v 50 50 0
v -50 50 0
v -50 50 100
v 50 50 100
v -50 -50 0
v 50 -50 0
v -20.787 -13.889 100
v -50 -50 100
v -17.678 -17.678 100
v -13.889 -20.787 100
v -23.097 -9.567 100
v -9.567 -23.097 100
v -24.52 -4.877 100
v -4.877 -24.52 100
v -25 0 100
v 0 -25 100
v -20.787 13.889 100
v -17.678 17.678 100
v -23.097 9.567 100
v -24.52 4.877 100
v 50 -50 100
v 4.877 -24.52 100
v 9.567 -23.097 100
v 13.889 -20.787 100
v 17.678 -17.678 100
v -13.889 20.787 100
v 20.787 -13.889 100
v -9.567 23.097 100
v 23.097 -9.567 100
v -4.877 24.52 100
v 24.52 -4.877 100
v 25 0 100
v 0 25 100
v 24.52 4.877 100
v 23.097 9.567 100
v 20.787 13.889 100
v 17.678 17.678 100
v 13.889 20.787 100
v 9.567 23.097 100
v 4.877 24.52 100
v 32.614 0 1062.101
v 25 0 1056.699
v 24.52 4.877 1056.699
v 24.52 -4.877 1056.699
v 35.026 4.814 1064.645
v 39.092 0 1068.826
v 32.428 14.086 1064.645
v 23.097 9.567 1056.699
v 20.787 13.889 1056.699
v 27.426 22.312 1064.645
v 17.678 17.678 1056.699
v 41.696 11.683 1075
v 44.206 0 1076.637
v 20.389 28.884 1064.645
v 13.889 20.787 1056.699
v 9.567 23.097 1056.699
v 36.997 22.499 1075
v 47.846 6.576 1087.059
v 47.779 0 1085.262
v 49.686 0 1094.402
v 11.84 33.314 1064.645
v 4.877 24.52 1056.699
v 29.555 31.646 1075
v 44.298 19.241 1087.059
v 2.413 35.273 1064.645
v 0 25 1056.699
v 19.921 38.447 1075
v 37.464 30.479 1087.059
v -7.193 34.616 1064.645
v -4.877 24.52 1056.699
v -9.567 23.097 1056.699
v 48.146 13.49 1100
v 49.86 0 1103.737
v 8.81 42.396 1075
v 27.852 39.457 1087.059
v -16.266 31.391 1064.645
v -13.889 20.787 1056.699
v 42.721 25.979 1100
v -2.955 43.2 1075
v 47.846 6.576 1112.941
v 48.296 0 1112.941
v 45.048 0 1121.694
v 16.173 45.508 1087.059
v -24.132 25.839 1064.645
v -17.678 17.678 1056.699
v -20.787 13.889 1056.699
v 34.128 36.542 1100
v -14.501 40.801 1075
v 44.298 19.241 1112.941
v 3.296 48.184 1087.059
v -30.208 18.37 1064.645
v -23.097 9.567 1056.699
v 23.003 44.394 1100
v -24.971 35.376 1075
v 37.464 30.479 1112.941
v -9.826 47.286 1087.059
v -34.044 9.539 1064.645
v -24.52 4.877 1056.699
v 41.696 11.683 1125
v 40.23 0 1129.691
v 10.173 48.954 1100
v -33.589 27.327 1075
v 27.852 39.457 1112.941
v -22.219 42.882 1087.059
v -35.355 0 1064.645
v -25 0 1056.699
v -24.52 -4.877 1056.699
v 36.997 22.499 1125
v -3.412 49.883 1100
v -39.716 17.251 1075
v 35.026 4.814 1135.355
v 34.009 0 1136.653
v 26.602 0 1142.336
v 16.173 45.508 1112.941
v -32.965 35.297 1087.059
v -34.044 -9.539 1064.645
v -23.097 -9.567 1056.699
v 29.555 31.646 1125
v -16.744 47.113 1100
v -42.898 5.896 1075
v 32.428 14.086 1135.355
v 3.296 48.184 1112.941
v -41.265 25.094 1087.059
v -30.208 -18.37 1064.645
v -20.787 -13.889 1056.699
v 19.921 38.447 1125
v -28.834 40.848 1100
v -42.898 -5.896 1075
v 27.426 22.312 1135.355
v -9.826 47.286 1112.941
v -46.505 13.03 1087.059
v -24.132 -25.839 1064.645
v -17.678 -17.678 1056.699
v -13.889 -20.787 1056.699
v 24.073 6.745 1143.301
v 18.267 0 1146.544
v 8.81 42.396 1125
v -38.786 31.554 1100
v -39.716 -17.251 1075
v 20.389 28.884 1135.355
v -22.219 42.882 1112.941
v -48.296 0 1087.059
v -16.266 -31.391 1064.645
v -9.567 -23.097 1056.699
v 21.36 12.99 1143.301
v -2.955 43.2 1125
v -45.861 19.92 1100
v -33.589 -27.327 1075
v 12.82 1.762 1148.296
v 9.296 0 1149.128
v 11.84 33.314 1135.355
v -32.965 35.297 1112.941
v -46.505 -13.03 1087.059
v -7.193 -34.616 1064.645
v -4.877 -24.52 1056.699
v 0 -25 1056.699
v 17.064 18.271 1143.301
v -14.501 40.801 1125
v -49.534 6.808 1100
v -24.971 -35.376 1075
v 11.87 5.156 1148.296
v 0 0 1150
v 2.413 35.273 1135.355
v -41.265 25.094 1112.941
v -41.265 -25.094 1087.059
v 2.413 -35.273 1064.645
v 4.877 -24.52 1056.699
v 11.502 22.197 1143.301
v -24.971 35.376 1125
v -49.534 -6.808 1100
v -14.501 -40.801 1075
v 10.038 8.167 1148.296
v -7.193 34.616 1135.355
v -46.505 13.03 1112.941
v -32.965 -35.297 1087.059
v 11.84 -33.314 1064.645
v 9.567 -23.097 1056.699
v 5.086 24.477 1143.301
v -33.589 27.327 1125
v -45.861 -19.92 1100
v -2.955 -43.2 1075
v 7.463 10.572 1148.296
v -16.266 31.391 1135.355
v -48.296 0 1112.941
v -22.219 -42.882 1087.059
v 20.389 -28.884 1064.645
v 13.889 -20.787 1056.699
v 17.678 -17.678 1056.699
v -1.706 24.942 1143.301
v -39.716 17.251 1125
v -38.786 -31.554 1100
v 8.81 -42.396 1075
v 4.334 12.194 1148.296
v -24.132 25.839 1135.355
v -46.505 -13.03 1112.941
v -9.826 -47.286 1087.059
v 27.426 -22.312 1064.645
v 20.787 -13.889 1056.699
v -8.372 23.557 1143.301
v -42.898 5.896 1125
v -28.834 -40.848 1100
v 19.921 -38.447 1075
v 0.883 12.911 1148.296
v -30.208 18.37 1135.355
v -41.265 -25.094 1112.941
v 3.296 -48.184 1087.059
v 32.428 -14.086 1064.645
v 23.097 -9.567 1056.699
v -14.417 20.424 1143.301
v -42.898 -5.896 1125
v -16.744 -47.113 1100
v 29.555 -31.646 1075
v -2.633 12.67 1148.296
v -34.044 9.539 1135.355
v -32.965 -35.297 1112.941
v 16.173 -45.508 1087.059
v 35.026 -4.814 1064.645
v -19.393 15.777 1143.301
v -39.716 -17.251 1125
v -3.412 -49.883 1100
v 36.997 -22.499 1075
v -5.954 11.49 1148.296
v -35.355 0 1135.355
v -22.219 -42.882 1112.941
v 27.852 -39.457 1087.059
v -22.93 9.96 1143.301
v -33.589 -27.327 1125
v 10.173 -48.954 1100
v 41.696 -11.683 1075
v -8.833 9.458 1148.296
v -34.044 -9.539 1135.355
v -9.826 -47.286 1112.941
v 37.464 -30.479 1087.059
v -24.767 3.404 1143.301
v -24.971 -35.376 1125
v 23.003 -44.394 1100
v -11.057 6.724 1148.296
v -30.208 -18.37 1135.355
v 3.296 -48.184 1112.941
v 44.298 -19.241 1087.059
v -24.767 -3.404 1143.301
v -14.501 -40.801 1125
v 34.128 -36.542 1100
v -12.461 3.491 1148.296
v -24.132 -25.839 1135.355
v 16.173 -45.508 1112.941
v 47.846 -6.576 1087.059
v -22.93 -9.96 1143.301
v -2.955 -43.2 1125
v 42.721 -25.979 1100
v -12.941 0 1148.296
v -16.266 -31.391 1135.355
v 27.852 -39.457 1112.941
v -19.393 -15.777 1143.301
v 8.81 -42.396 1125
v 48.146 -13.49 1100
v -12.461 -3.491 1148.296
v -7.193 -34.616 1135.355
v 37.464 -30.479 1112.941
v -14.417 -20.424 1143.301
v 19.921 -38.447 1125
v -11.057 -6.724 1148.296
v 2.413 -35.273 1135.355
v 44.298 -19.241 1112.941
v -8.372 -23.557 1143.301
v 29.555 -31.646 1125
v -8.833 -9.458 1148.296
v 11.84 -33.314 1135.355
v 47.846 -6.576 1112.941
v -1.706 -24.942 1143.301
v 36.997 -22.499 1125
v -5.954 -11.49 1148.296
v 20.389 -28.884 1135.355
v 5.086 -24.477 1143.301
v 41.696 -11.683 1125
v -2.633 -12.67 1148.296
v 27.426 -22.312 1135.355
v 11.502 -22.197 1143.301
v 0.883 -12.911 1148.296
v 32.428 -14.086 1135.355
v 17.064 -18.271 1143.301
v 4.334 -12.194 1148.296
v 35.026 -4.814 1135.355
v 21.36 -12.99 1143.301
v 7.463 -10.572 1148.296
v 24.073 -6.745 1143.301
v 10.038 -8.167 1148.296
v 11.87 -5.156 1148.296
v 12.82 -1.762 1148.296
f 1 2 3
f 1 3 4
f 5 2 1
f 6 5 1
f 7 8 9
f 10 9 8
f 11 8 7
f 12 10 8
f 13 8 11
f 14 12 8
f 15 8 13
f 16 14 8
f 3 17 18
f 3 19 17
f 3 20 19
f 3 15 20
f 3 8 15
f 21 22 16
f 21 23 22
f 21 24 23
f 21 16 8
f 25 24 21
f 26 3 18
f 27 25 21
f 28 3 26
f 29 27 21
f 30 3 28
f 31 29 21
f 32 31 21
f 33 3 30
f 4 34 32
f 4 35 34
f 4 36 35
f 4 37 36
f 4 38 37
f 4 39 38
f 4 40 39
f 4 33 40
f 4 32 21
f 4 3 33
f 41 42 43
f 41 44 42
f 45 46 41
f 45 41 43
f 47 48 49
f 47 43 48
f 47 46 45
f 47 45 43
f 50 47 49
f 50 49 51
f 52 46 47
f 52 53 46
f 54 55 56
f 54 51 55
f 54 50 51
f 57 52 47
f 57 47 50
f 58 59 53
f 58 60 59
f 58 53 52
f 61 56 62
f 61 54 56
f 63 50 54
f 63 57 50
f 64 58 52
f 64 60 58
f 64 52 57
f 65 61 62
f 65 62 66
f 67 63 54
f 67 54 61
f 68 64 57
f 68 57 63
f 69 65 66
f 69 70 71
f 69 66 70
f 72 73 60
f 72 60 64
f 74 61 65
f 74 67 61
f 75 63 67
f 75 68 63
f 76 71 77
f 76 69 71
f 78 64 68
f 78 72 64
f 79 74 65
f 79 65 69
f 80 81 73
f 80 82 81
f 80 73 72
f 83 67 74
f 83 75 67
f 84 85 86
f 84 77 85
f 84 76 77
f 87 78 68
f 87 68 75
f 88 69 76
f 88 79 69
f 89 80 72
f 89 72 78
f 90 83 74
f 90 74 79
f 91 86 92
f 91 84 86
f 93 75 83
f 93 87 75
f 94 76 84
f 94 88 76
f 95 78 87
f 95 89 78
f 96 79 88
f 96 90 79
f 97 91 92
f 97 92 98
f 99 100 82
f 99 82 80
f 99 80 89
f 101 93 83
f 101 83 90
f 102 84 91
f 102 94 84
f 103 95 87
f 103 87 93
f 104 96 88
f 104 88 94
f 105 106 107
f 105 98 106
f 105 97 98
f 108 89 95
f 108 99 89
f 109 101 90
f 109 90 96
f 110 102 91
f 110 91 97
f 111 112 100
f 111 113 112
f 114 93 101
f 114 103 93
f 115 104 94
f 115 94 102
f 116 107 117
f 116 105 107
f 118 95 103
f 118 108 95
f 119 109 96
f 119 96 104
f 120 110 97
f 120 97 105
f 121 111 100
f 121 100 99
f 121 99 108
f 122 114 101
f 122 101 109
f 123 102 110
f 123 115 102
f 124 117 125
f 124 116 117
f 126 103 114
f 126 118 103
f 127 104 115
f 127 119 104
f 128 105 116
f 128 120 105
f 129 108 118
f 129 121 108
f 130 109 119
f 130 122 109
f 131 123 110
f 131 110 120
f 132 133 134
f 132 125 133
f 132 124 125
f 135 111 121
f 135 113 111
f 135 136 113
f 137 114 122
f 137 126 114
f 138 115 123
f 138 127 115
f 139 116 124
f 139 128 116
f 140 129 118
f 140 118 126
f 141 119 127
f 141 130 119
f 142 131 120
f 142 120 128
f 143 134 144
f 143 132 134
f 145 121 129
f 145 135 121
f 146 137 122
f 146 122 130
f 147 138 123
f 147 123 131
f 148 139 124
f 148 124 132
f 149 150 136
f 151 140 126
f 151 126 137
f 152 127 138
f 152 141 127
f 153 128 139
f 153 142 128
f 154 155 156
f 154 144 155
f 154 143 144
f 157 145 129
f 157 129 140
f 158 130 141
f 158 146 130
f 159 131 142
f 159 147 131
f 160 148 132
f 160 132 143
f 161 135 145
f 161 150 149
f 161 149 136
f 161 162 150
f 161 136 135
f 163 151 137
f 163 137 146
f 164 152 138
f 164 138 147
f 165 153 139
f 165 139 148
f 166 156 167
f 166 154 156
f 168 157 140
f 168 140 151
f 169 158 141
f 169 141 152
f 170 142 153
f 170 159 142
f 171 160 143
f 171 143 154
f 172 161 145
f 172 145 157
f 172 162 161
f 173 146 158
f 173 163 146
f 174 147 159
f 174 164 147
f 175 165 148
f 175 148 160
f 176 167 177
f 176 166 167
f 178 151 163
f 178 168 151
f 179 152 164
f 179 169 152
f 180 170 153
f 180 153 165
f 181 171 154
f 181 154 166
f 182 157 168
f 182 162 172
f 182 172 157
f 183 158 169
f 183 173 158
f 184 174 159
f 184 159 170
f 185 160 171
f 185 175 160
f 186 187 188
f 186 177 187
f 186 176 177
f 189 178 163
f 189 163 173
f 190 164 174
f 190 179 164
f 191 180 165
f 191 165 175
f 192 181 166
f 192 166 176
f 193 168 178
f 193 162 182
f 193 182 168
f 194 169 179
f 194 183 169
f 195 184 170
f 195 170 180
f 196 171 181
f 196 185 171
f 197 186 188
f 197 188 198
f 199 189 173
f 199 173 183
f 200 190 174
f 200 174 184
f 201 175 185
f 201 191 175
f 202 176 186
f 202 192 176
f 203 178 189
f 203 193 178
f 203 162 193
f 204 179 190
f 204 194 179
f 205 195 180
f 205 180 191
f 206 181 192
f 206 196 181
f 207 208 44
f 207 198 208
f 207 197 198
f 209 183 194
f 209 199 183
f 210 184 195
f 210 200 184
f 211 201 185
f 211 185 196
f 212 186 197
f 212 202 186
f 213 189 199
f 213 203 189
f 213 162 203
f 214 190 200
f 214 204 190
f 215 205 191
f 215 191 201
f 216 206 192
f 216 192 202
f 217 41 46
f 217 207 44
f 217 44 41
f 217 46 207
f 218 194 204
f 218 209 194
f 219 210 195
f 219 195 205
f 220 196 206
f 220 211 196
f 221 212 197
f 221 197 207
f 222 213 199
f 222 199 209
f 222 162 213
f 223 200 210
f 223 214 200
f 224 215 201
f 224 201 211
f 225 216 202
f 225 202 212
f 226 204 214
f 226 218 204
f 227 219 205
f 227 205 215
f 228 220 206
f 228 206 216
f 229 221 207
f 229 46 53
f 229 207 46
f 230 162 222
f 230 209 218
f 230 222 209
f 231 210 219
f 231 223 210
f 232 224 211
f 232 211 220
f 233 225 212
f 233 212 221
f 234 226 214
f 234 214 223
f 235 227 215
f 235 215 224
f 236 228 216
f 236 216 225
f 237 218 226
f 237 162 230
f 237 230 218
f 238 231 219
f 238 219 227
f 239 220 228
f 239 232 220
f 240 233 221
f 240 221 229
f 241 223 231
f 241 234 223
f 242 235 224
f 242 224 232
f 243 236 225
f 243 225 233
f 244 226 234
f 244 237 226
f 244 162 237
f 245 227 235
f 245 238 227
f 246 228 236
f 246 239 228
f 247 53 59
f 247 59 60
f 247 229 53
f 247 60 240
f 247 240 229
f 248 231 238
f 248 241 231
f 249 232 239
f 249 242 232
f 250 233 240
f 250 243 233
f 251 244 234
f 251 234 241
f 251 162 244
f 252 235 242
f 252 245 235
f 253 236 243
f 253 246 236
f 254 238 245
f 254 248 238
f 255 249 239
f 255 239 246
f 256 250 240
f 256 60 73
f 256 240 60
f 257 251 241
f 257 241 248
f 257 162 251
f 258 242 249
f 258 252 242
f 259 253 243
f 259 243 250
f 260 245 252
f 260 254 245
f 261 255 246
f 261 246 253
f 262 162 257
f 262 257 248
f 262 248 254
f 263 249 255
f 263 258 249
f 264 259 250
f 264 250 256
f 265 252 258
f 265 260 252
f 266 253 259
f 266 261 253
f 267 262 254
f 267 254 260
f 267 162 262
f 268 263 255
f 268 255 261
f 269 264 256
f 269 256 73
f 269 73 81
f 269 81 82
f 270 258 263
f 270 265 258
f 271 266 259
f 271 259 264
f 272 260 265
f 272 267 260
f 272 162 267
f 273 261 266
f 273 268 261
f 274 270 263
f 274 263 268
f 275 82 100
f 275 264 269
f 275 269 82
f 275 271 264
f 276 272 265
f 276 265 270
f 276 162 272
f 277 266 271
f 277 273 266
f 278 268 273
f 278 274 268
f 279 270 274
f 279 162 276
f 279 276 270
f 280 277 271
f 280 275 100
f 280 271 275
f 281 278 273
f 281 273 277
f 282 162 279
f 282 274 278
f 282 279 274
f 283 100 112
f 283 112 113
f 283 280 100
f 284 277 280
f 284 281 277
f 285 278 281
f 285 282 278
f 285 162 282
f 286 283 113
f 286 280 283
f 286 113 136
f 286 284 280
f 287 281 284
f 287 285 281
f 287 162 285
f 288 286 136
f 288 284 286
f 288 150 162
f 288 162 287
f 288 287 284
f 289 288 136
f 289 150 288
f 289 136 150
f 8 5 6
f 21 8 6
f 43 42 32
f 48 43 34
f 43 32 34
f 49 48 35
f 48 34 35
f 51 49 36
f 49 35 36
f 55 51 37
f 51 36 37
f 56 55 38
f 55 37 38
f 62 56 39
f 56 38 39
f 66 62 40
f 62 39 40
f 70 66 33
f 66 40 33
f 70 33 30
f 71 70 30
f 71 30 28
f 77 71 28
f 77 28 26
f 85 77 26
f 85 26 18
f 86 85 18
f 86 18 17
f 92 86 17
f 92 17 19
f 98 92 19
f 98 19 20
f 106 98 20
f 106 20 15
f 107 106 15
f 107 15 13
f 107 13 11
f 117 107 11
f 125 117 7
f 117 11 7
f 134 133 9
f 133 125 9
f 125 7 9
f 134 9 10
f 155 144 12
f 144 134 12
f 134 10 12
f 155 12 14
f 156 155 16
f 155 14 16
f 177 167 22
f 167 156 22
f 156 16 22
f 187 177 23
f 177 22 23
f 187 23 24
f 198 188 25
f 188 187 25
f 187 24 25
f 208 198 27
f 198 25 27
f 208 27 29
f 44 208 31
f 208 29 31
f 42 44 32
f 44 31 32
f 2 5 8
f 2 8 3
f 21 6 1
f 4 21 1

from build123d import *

# Parameters (mm, degrees)
CYLINDER_R     = 25
CYLINDER_DEPTH = 1000
CUBE_W         = 100
CUBE_H         = 100
CUBE_DEPTH     = 100


with BuildPart() as cylinder:
    # cylinder → cylinder (new body)
    with BuildSketch(Plane.XY.offset(100)):
        Circle(CYLINDER_R)
    extrude(amount=CYLINDER_DEPTH)


with BuildPart() as sphere:
    # sphere → sphere (revolve)
    with BuildSketch(Plane(origin=(0, 0, 1100), x_dir=(1, 0, 0), z_dir=(0, -1, 0))):
        with BuildLine():
            ThreePointArc((0, -50), (50, 0), (0, 50))
            Line((0, 50), (0, -50))
        make_face()
    revolve(axis=Axis((0, 0, 1100), (0, 0, 1)))


with BuildPart() as union:
    # cube → cube (new body)
    with BuildSketch(Plane(origin=(-50, -50, 0), x_dir=(1, 0, 0), z_dir=(0, 0, 1))):
        with Locations((50, 50)):
            Rectangle(CUBE_W, CUBE_H)
    extrude(amount=CUBE_DEPTH)

    # union: union cylinder, sphere
    add(cylinder.part)
    add(sphere.part)


solid = union.part
